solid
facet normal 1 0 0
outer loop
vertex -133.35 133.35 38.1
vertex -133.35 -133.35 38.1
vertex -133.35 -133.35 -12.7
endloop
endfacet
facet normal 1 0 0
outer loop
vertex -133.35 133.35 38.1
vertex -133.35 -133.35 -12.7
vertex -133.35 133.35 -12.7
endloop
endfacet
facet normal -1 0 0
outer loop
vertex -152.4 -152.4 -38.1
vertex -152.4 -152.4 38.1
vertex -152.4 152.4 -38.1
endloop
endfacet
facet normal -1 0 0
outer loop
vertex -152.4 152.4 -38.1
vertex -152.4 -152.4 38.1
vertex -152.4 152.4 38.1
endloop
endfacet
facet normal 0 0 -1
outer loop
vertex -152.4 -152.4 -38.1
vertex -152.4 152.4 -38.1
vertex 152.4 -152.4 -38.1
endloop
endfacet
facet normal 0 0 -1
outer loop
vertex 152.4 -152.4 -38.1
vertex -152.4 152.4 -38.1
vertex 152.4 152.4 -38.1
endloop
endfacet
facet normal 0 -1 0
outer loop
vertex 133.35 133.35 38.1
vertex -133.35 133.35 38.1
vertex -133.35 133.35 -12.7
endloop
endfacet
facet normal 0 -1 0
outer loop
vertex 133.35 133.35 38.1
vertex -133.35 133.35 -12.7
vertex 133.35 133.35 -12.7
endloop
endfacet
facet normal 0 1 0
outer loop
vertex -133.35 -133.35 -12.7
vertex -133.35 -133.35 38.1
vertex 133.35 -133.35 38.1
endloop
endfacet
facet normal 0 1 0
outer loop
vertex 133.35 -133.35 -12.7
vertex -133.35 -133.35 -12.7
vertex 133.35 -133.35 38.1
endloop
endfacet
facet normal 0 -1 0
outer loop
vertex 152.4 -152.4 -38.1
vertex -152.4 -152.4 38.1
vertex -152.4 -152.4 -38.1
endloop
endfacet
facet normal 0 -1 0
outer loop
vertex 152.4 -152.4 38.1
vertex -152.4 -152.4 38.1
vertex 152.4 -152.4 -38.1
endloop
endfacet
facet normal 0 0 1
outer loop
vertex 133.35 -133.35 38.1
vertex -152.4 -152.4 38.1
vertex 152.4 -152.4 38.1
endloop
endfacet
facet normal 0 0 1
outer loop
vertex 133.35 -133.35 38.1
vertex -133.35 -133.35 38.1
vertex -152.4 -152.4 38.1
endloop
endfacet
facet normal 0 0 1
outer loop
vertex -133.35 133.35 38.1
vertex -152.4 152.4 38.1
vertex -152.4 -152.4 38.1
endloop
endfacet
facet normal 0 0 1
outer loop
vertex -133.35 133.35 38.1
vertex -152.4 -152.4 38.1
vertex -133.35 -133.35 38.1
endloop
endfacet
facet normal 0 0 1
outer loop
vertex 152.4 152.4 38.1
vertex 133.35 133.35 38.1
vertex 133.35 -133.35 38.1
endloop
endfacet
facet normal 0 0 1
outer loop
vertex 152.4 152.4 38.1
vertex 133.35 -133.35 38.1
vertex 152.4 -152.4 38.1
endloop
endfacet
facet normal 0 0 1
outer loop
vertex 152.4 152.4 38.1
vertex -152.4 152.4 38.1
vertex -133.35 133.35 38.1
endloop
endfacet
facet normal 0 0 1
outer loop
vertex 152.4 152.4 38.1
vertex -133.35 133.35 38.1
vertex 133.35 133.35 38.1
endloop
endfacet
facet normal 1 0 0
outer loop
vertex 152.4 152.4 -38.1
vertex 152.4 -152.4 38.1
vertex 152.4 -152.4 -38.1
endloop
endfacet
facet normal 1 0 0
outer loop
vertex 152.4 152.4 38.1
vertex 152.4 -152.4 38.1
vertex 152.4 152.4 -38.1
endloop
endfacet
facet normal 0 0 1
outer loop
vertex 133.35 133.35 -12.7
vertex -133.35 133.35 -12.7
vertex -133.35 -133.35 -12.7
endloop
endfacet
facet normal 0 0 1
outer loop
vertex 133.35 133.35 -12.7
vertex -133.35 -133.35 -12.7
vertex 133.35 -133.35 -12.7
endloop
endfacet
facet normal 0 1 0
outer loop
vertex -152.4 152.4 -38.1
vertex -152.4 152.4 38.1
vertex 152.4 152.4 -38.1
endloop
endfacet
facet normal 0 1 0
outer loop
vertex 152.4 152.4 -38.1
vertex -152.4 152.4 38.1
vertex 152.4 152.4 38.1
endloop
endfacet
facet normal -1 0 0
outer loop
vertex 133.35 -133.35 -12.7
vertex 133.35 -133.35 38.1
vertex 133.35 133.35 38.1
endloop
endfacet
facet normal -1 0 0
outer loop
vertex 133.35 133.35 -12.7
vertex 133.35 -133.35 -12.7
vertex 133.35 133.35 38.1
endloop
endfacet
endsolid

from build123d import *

# Parameters (mm, degrees)
F0_W     = 304.8
F0_H     = 304.8
F1_DEPTH = 38.1
F2_W     = 266.7
F2_H     = 266.7
F3_DEPTH = 50.8


with BuildPart() as f1:
    # F0 (on Top) → F1 (new body, symmetric)
    with BuildSketch(Plane.XY):
        Rectangle(F0_W, F0_H)
    extrude(amount=F1_DEPTH, both=True)

    # F2 (on face) → F3 (cut)
    with BuildSketch(Plane.XY.offset(38.1)):
        Rectangle(F2_W, F2_H)
    extrude(amount=-F3_DEPTH, mode=Mode.SUBTRACT)


solid = f1.part
